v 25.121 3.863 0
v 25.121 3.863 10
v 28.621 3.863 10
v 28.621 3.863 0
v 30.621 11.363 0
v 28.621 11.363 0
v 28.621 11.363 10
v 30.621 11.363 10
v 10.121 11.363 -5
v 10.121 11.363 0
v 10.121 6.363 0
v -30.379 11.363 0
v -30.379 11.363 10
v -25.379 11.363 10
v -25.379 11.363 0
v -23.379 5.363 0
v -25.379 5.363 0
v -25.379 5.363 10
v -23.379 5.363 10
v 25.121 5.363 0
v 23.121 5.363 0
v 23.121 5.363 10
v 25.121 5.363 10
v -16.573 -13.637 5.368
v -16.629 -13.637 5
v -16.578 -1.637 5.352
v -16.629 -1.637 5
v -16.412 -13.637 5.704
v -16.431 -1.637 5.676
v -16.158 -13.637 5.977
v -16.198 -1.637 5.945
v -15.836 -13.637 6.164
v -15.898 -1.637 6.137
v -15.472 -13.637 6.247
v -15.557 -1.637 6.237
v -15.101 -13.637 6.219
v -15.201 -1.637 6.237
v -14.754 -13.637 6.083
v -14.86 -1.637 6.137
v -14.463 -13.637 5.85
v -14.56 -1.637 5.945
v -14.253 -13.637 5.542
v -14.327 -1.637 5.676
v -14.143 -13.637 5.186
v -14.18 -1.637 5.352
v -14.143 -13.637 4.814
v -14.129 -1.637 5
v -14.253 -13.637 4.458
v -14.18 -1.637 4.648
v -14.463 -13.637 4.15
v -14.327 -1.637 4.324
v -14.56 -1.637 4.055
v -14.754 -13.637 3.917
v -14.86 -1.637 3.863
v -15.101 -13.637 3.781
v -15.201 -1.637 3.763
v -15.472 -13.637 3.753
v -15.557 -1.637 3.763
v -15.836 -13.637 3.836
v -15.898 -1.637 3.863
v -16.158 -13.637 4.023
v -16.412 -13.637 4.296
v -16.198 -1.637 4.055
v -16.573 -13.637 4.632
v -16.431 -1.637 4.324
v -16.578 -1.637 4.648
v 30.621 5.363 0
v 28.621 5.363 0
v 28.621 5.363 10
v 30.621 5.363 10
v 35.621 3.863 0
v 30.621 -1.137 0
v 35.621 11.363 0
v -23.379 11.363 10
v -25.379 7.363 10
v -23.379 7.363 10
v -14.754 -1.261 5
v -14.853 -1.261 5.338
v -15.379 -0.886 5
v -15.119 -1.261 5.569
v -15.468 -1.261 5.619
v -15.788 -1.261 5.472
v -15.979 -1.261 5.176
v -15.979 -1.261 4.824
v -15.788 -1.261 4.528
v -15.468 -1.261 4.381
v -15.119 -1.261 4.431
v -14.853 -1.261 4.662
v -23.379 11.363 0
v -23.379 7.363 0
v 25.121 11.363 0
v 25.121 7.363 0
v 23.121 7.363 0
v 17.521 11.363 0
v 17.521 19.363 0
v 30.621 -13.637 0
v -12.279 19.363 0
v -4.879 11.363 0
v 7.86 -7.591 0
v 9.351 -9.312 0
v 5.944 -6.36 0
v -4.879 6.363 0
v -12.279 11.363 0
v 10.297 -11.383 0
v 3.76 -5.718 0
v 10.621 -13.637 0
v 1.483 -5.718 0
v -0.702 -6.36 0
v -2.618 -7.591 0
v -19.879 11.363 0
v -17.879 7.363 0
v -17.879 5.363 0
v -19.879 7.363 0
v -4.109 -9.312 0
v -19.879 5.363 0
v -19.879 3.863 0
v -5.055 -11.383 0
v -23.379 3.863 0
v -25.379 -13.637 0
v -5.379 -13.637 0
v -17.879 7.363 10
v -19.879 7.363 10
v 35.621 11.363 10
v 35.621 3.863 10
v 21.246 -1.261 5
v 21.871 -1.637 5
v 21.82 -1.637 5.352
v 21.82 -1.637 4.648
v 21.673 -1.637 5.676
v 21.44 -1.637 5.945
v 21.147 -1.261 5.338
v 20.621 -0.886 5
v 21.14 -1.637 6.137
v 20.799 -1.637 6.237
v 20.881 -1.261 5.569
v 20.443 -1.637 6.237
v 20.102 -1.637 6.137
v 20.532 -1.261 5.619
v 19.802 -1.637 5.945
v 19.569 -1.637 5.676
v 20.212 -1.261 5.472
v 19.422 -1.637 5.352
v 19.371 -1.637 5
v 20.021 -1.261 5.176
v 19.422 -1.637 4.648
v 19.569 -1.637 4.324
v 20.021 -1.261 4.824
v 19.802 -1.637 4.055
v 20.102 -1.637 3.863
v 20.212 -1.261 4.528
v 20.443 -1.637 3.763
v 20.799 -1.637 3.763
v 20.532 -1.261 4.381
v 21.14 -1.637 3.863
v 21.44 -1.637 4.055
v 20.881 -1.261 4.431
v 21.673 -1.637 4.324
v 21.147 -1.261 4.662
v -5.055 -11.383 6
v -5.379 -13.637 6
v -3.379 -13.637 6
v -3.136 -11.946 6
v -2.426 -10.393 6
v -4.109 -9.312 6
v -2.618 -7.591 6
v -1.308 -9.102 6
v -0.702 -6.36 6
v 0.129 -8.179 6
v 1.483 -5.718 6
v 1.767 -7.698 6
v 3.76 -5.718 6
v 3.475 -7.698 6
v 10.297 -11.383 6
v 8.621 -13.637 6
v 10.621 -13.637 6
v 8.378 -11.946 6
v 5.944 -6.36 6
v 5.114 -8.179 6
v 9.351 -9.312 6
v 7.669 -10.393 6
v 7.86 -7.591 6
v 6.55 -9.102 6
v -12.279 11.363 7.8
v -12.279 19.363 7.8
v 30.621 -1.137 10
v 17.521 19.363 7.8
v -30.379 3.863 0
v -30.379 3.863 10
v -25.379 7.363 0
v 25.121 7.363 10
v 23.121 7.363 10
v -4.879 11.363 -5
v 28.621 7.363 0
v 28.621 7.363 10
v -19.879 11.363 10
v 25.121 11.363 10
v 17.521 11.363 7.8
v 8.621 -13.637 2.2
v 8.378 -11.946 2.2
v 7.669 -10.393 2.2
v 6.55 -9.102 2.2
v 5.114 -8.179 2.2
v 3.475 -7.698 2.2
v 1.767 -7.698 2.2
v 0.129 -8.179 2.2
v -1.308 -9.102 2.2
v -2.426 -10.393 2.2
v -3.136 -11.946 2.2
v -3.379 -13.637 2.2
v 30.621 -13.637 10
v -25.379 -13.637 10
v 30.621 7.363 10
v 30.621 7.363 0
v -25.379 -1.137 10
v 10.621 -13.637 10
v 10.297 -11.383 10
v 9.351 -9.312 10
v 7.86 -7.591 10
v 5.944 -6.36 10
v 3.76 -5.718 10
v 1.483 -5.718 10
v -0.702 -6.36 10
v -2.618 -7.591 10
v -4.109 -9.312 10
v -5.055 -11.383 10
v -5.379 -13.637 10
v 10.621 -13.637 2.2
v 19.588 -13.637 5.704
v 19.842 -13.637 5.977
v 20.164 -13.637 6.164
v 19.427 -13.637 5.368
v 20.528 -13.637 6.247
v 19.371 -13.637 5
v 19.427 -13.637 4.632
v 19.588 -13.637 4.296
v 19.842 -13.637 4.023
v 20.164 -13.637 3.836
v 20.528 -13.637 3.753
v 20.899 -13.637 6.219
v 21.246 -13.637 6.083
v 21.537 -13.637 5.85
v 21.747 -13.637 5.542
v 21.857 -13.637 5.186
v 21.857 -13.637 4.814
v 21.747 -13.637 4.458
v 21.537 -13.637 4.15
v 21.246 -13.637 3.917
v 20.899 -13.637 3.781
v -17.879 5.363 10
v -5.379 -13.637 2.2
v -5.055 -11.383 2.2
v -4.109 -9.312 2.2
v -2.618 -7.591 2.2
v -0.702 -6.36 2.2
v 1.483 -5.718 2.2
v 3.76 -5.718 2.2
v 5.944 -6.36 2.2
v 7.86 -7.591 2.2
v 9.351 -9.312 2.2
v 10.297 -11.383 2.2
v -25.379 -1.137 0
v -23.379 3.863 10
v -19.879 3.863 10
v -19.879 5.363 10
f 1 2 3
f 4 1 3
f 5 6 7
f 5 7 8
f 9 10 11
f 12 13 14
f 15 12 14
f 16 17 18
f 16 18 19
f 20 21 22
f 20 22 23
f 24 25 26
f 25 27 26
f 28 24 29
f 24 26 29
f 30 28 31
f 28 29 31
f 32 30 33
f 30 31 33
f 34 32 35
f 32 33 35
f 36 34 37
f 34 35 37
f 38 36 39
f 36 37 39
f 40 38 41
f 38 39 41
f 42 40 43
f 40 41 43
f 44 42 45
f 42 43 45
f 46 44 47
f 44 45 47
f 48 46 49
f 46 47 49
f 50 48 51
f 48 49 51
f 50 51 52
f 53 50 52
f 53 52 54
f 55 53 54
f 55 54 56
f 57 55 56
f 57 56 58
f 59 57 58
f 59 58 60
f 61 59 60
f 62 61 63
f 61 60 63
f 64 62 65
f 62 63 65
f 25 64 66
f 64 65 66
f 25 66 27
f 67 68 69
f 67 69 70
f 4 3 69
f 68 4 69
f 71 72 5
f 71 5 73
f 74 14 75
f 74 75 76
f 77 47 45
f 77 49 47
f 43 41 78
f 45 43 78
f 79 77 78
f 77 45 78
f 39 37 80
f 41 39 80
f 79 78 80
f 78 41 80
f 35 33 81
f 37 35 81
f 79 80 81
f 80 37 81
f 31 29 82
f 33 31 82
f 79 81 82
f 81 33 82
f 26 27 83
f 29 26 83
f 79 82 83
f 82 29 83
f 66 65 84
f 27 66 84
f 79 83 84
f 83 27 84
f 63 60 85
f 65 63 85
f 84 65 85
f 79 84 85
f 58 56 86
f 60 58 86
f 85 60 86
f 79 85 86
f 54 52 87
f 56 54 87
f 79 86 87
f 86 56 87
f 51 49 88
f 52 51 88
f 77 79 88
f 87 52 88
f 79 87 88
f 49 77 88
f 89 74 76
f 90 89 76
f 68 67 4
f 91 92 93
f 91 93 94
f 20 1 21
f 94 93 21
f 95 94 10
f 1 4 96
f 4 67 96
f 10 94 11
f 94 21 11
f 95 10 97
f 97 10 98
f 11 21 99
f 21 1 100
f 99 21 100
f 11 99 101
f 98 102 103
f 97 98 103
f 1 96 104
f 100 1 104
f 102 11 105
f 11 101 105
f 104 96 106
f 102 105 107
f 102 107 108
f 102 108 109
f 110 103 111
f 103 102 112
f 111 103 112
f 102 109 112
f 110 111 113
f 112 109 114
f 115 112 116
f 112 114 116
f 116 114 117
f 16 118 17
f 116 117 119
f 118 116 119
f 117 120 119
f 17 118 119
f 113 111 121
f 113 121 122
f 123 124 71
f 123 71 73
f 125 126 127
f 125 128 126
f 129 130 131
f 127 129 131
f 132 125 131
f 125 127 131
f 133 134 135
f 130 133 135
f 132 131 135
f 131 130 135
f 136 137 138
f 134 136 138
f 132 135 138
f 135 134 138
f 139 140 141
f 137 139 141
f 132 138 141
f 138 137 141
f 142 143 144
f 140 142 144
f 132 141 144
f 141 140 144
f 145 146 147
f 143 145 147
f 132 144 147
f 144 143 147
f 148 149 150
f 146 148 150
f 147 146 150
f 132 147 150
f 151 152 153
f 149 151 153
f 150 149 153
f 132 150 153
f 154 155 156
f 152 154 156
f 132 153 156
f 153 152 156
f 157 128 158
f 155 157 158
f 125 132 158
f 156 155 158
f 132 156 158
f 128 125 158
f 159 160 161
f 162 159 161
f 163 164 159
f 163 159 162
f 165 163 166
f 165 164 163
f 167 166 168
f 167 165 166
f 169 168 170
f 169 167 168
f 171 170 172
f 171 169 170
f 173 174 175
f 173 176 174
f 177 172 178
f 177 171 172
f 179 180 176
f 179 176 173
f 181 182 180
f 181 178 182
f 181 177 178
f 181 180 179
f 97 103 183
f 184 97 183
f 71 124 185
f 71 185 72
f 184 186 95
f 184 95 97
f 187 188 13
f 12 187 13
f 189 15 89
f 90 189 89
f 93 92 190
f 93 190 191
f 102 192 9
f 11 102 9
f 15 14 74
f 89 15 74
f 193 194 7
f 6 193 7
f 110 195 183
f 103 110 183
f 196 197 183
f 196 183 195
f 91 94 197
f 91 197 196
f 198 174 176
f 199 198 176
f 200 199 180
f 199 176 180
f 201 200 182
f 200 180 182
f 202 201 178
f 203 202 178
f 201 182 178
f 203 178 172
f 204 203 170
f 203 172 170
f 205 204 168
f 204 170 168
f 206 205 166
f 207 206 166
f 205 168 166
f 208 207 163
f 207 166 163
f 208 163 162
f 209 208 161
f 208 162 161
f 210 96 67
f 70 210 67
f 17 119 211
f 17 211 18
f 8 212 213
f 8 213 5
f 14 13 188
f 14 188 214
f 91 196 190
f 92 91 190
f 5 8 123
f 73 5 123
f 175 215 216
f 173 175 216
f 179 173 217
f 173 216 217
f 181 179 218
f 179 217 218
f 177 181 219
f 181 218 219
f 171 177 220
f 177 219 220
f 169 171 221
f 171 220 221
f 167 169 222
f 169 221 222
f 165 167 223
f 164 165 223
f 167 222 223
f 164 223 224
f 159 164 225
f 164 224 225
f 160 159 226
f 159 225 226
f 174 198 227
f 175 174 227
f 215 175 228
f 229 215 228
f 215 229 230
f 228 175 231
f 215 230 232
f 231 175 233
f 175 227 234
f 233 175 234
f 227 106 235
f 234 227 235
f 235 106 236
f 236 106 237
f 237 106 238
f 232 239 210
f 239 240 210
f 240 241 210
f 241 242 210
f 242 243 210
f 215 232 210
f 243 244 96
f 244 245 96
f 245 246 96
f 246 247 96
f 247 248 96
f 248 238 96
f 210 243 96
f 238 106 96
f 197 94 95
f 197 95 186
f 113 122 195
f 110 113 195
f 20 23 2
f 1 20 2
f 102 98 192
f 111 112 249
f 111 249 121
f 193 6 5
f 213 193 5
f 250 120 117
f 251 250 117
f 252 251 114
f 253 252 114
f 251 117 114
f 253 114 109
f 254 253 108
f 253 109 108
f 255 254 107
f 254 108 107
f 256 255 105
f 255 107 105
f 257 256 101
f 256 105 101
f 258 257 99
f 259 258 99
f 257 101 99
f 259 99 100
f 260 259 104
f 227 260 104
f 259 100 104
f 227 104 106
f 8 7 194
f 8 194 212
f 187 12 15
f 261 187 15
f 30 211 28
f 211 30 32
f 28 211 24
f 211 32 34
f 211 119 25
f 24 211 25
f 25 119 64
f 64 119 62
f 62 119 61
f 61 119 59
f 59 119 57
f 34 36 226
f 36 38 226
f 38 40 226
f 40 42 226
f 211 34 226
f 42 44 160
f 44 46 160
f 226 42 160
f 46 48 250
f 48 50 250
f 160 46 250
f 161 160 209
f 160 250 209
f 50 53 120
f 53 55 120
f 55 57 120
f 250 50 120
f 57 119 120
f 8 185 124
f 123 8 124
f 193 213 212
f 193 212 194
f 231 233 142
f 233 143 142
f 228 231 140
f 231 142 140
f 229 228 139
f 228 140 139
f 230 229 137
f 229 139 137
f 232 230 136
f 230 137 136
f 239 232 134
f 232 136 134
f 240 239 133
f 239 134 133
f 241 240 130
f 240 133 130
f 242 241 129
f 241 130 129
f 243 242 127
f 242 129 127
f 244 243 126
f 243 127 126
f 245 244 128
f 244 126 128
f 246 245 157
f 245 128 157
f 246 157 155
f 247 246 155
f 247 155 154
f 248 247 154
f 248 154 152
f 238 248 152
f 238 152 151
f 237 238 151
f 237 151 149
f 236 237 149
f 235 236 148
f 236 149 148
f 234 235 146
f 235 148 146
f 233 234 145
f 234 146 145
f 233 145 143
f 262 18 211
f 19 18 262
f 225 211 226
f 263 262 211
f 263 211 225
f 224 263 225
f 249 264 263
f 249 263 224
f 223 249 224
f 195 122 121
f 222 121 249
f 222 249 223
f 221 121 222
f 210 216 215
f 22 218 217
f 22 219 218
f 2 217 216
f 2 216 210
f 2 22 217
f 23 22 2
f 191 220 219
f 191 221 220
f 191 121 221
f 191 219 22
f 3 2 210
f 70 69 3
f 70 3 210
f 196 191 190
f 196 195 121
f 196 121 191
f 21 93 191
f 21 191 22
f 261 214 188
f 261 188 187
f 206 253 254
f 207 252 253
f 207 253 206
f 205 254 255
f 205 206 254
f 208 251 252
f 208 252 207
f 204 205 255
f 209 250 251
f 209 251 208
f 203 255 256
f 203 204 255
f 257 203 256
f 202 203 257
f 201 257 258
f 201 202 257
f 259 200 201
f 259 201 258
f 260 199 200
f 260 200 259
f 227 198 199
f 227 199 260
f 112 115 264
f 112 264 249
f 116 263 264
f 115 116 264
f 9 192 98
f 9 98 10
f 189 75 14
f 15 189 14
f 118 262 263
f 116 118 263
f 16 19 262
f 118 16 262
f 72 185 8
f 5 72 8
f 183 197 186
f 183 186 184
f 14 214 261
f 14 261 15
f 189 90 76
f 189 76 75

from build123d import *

# Parameters (mm, degrees)
F0_W       = 56
F0_H       = 25
F1_DEPTH   = 10
F3_DEPTH   = 25
F5_DEPTH   = 25
F6_R       = 6
F7_DEPTH   = 25
F8_R       = 8
F9_DEPTH   = 4
F10_R      = 8
F11_DEPTH  = 2.2
F13_D      = 2.5
F13_DEPTH  = 12
F13_TIP    = 0.7510757738
F14_W      = 15
F14_H      = 5
F15_DEPTH  = 5
F16_SIZE   = 4.99999
F17_W      = 5
F17_H      = 12.5
F18_DEPTH  = 10
F19_SIZE   = 4.99999
F19_2_SIZE = 4.99999
F20_W      = 29.8
F20_H      = 7.8
F21_DEPTH  = 8


# Not quite as in the source:
# - a fillet or chamfer is up to 0.001 mm smaller than in the source, because OpenCascade refuses the exact size


with BuildPart() as f1:
    # F0 (on Top) → F1 (new body)
    with BuildSketch(Plane.XY):
        with Locations((2.6210285723, -1.1366620937)):
            Rectangle(F0_W, F0_H)
    extrude(amount=F1_DEPTH)

    # F2 (on face) → F3 (cut)
    with BuildSketch(Plane.XY.offset(10)):
        Polygon((28.6210285723, 7.3633379063), (28.6210285723, 11.3633379063), (25.1210285723, 11.3633379063), (25.1210285723, 7.3633379063), (23.1210285723, 7.3633379063), (23.1210285723, 5.3633379063), (25.1210285723, 5.3633379063), (25.1210285723, 3.8633379063), (28.6210285723, 3.8633379063), (28.6210285723, 5.3633379063), (30.6210285723, 5.3633379063), (30.6210285723, 7.3633379063), align=None)
    extrude(amount=-F3_DEPTH, mode=Mode.SUBTRACT)

    # F4 (on face) → F5 (cut)
    with BuildSketch(Plane.XY.offset(10)):
        Polygon((-19.8789714277, 7.3633379063), (-19.8789714277, 11.3633379063), (-23.3789714277, 11.3633379063), (-23.3789714277, 7.3633379063), (-25.3789714277, 7.3633379063), (-25.3789714277, 5.3633379063), (-23.3789714277, 5.3633379063), (-23.3789714277, 3.8633379063), (-19.8789714277, 3.8633379063), (-19.8789714277, 5.3633379063), (-17.8789714277, 5.3633379063), (-17.8789714277, 7.3633379063), align=None)
    extrude(amount=-F5_DEPTH, mode=Mode.SUBTRACT)

    # F6 (on face) → F7 (cut)
    with BuildSketch(Plane.XY.offset(10)):
        with Locations((2.6210285723, -13.6366620937)):
            Circle(F6_R)
    extrude(amount=-F7_DEPTH, mode=Mode.SUBTRACT)

    # F8 (on face) → F9 (cut)
    with BuildSketch(Plane.XY.offset(10)):
        with Locations((2.6210285723, -13.6366620937)):
            Circle(F8_R)
    extrude(amount=-F9_DEPTH, mode=Mode.SUBTRACT)

    # F10 (on face) → F11 (cut)
    with BuildSketch(Plane(origin=(0, 0, 0), x_dir=(1, 0, 0), z_dir=(0, 0, -1))):
        with Locations((2.6210285723, 13.6366620937)):
            Circle(F10_R)
    extrude(amount=-F11_DEPTH, mode=Mode.SUBTRACT)

    # F13
    with Locations(Plane.XZ.offset(13.6366620937)):
        with Locations((-15.3789714277, 5), (20.6210285723, 5)):
            Hole(F13_D / 2, depth=F13_DEPTH)
            with Locations((0, 0, -(F13_DEPTH + F13_TIP / 2))):  # 118° drill point
                Cone(0, F13_D / 2, F13_TIP, mode=Mode.SUBTRACT)

    # F14 (on face) → F15 (join)
    with BuildSketch(Plane(origin=(0, 0, 0), x_dir=(1, 0, 0), z_dir=(0, 0, -1))):
        with Locations((2.6210285723, -8.8633379063)):
            Rectangle(F14_W, F14_H)
    extrude(amount=F15_DEPTH)

    # F16 (size 5 in the source; OpenCascade refuses exactly that, so slightly less here)
    f16_edges = [f1.edges().sort_by_distance(p)[0] for p in [
        (2.621029, 6.363338, -5),
    ]]
    chamfer(f16_edges, length=F16_SIZE)

    # F20 (on face) → F21 (join)
    with BuildSketch(Plane(origin=(0, 11.3633379063, 0), x_dir=(-1, 0, 0), z_dir=(0, 1, 0))):
        with Locations((-2.6210285723, 3.9)):
            Rectangle(F20_W, F20_H)
    extrude(amount=F21_DEPTH)


with BuildPart() as f18:
    # F17 (on face) → F18 (new body)
    with BuildSketch(Plane.XY.offset(10)):
        with Locations((-27.8789714277, 5.1133379063)):
            Rectangle(F17_W, F17_H)
    extrude(amount=-F18_DEPTH)

    # F19#2 (size 5 in the source; OpenCascade refuses exactly that, so slightly less here)
    f19_2_edges = [f18.edges().sort_by_distance(p)[0] for p in [
        (-30.378971, -1.136662, 5),
    ]]
    chamfer(f19_2_edges, length=F19_2_SIZE)


with BuildPart() as f18b:
    # F17 (on face) → F18, piece 2 (new body)
    with BuildSketch(Plane.XY.offset(10)):
        with Locations((33.1210285723, 5.1133379063)):
            Rectangle(F17_W, F17_H)
    extrude(amount=-F18_DEPTH)

    # F19 (size 5 in the source; OpenCascade refuses exactly that, so slightly less here)
    f19_edges = [f18b.edges().sort_by_distance(p)[0] for p in [
        (35.621029, -1.136662, 5),
    ]]
    chamfer(f19_edges, length=F19_SIZE)


solid = Compound([f1.part, f18.part, f18b.part])
